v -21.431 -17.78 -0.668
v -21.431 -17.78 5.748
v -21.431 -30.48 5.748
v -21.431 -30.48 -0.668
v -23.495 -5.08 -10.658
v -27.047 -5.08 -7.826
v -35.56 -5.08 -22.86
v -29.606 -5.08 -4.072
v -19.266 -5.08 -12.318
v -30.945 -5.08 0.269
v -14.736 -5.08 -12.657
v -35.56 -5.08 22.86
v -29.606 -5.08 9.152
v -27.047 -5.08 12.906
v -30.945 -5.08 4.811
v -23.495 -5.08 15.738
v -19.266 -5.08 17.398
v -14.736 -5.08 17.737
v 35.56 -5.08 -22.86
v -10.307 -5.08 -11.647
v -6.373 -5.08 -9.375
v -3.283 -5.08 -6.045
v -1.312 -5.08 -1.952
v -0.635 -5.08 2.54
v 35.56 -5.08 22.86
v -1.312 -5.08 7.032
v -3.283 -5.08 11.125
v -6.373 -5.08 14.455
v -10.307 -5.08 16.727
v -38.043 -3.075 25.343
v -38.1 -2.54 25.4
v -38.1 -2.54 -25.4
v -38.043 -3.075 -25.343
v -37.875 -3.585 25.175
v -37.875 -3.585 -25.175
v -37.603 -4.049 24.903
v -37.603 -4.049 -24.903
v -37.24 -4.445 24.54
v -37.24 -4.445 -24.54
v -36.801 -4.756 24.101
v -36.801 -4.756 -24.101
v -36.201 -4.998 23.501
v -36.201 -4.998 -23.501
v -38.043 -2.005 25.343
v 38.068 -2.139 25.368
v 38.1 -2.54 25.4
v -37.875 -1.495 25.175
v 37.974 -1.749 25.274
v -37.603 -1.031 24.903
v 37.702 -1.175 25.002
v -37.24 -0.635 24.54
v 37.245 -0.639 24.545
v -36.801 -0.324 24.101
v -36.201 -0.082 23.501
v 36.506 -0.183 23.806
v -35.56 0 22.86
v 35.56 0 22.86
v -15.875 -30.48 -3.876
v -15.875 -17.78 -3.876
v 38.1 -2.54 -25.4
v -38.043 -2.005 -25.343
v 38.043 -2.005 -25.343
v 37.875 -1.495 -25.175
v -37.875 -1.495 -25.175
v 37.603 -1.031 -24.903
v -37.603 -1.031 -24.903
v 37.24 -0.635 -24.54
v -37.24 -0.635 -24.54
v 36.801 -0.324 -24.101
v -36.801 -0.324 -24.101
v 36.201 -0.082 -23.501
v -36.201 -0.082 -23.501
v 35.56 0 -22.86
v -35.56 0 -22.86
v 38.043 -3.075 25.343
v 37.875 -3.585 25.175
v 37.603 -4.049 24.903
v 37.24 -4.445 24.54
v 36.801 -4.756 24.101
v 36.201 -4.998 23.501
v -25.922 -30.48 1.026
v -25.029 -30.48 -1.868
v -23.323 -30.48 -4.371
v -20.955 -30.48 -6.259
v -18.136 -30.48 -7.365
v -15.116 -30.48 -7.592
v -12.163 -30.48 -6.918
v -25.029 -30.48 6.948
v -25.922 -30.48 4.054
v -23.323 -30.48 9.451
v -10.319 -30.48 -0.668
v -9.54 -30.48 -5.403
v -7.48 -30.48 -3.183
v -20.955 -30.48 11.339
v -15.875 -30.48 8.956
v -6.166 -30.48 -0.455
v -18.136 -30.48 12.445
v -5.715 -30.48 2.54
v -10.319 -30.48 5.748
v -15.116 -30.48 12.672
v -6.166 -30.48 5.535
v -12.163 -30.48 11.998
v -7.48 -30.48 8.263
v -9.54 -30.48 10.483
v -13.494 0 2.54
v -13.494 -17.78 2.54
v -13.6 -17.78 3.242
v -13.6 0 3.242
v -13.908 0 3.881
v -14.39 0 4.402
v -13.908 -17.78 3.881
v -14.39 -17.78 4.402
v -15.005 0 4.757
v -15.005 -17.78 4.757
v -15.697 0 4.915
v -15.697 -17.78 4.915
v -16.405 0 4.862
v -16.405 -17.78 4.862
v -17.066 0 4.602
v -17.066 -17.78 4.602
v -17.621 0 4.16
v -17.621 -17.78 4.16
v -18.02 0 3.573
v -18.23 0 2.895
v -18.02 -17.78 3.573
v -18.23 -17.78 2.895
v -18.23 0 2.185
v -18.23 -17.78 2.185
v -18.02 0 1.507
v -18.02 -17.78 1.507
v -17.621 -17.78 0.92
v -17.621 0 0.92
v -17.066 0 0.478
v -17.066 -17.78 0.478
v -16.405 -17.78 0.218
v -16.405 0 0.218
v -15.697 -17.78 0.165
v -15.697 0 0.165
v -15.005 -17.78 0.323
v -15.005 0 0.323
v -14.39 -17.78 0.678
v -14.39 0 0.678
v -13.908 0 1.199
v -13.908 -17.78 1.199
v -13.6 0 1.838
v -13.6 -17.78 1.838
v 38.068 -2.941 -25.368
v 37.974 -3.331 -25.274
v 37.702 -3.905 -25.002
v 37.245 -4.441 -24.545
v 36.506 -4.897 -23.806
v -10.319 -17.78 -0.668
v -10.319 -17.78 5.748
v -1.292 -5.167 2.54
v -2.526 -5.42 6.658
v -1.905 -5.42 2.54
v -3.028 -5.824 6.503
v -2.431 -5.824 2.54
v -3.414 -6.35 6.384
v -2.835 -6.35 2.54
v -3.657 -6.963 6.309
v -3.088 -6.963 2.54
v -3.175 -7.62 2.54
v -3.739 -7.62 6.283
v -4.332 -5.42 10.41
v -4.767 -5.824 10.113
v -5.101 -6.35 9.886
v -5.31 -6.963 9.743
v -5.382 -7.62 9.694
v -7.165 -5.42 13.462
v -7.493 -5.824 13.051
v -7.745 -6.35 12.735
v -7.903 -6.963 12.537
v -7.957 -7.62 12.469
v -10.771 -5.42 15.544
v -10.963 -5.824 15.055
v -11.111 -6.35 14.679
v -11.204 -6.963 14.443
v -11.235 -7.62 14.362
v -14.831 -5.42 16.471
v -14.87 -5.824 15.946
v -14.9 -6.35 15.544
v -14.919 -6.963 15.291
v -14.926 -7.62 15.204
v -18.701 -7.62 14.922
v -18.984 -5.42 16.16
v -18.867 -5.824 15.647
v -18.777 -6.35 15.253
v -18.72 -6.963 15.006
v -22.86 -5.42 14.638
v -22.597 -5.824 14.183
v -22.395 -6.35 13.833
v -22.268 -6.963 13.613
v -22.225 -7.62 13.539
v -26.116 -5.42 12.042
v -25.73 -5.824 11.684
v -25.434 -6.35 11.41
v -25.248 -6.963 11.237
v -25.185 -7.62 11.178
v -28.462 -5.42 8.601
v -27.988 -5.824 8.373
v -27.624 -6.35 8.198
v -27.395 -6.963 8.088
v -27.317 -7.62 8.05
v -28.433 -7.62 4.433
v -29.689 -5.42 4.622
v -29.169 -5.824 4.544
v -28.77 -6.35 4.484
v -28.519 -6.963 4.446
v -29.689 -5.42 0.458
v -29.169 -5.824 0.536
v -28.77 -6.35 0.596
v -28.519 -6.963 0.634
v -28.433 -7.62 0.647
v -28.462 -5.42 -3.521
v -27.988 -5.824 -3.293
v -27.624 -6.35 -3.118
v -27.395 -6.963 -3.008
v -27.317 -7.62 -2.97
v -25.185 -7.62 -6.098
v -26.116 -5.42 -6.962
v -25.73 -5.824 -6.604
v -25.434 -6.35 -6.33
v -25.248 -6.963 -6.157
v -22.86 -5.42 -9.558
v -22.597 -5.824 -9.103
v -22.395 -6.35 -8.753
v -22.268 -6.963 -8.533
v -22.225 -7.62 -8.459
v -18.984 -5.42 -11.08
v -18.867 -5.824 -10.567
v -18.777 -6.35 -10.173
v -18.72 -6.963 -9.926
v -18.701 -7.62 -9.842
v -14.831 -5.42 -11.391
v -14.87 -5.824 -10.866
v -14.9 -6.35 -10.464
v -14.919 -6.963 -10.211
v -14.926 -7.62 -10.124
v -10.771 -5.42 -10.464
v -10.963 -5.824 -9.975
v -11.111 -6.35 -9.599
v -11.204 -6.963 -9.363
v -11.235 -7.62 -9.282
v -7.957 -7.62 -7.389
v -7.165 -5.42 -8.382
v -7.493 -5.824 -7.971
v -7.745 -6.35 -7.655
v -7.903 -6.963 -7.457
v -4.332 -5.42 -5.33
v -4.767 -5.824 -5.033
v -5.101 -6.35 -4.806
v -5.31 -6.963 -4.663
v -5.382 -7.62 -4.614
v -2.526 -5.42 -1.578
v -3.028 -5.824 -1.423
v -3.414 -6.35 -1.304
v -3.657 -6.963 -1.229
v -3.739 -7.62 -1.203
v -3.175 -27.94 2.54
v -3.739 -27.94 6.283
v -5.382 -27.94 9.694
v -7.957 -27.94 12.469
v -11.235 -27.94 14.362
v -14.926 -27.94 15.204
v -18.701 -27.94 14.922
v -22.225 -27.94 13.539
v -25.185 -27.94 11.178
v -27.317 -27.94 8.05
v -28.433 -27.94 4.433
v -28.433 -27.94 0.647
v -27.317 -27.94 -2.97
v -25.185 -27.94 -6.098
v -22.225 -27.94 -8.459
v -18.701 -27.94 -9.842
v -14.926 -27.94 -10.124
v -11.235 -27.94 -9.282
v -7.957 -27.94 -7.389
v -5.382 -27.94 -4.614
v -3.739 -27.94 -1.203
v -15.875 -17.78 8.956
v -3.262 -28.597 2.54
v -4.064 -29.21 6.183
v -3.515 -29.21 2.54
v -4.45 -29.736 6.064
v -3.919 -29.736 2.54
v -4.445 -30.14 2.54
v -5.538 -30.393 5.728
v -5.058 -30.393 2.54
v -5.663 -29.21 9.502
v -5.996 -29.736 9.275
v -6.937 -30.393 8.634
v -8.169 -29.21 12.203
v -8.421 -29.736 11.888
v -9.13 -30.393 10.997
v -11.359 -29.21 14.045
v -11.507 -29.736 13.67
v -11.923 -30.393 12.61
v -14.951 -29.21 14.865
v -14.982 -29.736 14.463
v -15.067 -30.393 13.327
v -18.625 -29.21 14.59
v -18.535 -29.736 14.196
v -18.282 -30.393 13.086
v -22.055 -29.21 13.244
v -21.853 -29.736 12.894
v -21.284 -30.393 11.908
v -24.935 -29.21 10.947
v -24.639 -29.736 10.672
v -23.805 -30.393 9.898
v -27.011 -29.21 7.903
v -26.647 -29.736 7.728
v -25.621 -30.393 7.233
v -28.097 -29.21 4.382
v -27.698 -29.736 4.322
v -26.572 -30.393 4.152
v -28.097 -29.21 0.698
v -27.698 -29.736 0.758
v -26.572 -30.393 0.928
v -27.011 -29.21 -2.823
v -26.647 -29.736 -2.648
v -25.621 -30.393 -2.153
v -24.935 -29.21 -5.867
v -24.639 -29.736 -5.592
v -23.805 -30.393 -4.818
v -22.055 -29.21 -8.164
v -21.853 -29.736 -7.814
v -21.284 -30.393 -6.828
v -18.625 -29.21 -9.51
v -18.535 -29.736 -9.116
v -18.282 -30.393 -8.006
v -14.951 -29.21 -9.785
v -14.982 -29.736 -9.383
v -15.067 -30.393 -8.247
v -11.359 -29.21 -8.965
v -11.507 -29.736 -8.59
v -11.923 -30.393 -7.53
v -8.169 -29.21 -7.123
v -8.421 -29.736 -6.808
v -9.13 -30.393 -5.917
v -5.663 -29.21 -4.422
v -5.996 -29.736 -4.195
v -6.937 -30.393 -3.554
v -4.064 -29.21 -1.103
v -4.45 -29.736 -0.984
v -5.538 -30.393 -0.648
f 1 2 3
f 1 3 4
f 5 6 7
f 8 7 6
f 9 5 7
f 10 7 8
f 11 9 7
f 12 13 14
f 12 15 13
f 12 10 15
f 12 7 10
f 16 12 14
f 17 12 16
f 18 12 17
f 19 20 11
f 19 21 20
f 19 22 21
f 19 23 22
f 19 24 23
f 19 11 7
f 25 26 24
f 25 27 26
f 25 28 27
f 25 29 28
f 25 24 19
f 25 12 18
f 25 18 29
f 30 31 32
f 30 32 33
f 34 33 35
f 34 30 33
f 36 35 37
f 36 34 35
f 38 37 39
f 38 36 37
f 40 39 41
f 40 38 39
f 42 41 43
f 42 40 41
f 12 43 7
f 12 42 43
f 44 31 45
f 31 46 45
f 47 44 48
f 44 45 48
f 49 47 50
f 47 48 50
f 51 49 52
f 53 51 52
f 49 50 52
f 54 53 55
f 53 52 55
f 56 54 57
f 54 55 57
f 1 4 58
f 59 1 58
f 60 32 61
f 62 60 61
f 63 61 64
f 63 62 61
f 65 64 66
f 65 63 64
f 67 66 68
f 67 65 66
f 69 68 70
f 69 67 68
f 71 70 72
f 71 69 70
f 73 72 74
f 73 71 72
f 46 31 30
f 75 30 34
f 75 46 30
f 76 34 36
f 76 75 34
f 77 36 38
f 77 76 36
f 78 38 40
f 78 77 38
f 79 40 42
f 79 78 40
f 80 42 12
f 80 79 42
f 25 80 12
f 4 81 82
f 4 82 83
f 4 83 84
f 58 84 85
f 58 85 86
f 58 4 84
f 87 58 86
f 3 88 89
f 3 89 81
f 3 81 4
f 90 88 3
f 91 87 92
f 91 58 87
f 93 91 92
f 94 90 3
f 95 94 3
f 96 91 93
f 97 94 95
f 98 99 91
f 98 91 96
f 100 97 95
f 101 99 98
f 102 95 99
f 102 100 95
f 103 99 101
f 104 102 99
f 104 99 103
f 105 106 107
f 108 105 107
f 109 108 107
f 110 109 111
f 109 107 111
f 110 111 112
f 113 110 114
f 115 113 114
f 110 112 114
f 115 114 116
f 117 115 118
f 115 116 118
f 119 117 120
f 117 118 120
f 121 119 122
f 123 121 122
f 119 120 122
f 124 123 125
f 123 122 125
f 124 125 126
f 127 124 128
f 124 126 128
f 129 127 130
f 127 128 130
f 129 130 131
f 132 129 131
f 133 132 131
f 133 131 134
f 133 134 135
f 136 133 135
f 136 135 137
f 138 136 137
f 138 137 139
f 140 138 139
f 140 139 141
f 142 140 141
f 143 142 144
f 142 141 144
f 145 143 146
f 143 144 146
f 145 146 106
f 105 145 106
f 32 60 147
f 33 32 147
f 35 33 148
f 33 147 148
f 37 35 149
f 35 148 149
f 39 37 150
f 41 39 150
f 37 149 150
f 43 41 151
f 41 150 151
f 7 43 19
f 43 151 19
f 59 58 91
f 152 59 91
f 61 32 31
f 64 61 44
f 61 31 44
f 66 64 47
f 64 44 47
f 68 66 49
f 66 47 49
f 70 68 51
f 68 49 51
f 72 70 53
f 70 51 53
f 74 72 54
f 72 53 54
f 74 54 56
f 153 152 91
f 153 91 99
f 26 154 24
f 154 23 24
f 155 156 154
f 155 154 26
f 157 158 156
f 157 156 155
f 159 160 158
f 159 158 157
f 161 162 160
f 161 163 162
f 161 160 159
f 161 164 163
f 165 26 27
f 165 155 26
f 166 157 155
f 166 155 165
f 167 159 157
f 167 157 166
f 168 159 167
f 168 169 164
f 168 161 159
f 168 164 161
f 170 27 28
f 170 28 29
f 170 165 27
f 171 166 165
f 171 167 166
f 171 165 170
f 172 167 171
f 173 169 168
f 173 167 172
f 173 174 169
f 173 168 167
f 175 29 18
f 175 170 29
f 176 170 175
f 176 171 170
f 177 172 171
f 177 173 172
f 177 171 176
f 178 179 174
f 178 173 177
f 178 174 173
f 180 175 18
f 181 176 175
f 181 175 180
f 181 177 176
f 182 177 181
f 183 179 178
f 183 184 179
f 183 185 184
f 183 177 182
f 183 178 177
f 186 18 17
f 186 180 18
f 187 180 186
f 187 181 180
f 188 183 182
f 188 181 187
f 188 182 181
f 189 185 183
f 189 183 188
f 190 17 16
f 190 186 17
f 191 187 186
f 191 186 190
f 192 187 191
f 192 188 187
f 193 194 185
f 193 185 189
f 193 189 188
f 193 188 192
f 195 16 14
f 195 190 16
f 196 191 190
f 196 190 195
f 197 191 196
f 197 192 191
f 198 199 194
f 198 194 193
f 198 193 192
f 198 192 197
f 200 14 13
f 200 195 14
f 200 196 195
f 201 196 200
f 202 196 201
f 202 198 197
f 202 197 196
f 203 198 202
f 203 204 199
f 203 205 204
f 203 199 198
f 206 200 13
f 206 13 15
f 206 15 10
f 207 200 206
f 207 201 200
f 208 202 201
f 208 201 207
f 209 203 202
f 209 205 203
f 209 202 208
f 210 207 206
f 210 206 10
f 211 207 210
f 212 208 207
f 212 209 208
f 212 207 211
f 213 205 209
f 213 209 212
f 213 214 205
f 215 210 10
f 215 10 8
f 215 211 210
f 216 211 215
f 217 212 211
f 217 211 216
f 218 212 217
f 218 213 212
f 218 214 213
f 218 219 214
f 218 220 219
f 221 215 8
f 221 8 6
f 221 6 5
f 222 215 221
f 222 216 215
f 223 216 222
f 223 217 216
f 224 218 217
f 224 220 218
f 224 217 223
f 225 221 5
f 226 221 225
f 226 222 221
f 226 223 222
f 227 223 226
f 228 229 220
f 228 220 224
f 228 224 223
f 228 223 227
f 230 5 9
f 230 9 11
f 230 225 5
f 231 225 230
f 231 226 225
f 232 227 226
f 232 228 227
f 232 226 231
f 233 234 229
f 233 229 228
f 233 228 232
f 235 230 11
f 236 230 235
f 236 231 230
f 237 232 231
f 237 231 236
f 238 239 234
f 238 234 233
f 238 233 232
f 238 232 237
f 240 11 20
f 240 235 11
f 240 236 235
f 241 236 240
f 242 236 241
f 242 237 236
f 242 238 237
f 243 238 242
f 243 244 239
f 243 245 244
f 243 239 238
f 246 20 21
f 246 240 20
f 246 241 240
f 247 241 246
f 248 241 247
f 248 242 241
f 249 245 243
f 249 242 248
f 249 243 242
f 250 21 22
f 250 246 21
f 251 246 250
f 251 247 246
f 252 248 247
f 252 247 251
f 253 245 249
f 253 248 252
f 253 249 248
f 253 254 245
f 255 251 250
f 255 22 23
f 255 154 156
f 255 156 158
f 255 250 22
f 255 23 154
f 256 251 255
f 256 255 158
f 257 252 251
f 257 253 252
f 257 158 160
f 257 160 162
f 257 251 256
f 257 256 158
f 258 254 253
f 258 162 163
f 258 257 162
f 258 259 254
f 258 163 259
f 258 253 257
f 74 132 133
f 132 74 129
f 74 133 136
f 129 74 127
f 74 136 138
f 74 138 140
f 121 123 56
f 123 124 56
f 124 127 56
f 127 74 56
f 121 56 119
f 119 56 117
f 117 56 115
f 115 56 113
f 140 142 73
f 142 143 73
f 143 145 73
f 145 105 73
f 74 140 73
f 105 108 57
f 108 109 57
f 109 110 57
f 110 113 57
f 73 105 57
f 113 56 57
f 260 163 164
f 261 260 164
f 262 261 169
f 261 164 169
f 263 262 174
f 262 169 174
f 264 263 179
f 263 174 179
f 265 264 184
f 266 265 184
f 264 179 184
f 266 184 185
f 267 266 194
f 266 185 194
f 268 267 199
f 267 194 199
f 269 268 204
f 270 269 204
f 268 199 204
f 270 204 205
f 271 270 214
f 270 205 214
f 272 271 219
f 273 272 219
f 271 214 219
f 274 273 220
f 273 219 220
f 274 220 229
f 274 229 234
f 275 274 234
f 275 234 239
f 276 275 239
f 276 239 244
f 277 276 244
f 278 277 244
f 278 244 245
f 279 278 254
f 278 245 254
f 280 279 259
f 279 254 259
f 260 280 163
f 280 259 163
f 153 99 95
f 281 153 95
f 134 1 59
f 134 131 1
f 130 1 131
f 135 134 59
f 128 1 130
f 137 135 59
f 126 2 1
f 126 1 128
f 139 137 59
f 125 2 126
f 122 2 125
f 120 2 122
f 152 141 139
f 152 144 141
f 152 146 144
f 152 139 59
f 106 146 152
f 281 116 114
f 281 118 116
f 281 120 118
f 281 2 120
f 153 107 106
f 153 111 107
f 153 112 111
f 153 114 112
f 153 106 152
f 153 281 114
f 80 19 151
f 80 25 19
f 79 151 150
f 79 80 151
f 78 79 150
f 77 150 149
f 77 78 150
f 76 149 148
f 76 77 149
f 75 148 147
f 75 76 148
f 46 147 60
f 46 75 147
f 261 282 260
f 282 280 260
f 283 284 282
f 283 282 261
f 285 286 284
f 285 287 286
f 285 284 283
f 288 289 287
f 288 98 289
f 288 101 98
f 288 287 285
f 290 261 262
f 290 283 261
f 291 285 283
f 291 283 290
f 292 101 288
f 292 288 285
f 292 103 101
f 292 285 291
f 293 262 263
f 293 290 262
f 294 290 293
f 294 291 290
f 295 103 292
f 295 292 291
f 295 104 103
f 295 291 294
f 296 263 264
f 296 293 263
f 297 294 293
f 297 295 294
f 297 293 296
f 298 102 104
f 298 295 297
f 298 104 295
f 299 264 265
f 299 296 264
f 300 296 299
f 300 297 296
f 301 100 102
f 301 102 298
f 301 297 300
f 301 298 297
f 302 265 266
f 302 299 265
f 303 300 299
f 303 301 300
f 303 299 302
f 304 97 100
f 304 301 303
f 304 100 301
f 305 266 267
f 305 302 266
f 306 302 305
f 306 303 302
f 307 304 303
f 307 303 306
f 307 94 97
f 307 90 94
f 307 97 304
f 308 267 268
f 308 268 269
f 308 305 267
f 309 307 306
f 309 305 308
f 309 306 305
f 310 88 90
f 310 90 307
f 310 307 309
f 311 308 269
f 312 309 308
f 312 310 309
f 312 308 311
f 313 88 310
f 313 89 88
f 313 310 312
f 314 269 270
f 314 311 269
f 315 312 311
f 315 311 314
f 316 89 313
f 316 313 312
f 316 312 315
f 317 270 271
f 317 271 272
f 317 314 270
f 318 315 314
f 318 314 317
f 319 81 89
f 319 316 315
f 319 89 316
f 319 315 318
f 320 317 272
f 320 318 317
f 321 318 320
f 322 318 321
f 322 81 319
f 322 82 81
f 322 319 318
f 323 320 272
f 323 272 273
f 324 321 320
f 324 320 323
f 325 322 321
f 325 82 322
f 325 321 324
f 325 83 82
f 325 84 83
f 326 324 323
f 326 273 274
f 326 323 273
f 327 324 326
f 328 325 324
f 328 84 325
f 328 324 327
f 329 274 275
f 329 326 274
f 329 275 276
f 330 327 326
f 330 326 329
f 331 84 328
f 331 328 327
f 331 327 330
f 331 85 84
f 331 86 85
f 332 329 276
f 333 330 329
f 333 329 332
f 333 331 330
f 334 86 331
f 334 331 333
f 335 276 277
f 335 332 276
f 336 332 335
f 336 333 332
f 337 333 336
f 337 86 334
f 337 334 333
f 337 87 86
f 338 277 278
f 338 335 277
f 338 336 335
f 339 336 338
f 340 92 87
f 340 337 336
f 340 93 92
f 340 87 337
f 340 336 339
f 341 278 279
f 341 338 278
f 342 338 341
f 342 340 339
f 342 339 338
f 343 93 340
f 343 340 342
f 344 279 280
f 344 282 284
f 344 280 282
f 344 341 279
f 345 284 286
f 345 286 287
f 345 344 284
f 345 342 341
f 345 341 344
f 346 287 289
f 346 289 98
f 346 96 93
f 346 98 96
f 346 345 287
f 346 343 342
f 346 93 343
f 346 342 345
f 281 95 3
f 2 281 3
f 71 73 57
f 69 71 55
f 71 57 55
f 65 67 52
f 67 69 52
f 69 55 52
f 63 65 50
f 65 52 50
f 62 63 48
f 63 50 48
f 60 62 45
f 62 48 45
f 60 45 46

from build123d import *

# Parameters (mm, degrees)
F0_W     = 76.2
F0_H     = 50.8
F1_DEPTH = 5.08
F2_R     = 12.7
F3_DEPTH = 25.4
F5_DEPTH = 12.7
F6_R     = 2.38125
F7_DEPTH = 17.78
F8_R     = 2.53999


# Not quite as in the source:
# - a fillet or chamfer is up to 0.001 mm smaller than in the source, because OpenCascade refuses the exact size


with BuildPart() as f1:
    # F0 (on Front) → F1 (new body)
    with BuildSketch(Plane.XZ):
        Rectangle(F0_W, F0_H)
    extrude(amount=F1_DEPTH)

    # F2 (on face) → F3 (join)
    with BuildSketch(Plane.XZ.offset(5.08)):
        with Locations((-15.875, 2.54)):
            Circle(F2_R)
    extrude(amount=F3_DEPTH)

    # F4 (on face) → F5 (cut)
    with BuildSketch(Plane.XZ.offset(30.48)):
        Polygon((-10.31875, 5.7479024332), (-15.875, 8.9558048664), (-21.43125, 5.7479024332), (-21.43125, -0.6679024332), (-15.875, -3.8758048664), (-10.31875, -0.6679024332), align=None)
    extrude(amount=-F5_DEPTH, mode=Mode.SUBTRACT)

    # F6 (on face) → F7 (cut, through all)
    with BuildSketch(Plane.XZ.offset(17.78)):
        with Locations((-15.875, 2.54)):
            Circle(F6_R)
    extrude(amount=-F7_DEPTH, mode=Mode.SUBTRACT)

    # F8 (radius 2.54 in the source; OpenCascade refuses exactly that, so slightly less here)
    f8_edges = [f1.edges().sort_by_distance(p)[0] for p in [
        (-28.575, -30.48, 2.54),
        (-28.575, -5.08, 2.54),
        (0, -5.08, 25.4),
        (38.1, -5.08, 0),
        (0, -5.08, -25.4),
        (-38.1, -5.08, 0),
        (0, 0, -25.4),
        (-38.1, 0, 0),
        (38.1, 0, 0),
        (0, 0, 25.4),
    ]]
    fillet(f8_edges, radius=F8_R)


solid = f1.part
